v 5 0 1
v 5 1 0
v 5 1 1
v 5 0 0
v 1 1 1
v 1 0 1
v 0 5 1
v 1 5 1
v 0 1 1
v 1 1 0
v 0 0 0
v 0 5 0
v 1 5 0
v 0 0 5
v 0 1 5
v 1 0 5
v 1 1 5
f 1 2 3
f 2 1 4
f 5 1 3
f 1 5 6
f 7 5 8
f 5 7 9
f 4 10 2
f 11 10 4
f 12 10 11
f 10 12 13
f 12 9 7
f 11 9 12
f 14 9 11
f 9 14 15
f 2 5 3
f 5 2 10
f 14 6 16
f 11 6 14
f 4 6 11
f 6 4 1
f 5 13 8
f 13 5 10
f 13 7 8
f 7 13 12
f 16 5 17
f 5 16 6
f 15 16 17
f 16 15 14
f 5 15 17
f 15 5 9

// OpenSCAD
union() {
    cube(size=[5,1,1]);
    cube(size=[1,5,1]);
    cube(size=[1,1,5]);
}
